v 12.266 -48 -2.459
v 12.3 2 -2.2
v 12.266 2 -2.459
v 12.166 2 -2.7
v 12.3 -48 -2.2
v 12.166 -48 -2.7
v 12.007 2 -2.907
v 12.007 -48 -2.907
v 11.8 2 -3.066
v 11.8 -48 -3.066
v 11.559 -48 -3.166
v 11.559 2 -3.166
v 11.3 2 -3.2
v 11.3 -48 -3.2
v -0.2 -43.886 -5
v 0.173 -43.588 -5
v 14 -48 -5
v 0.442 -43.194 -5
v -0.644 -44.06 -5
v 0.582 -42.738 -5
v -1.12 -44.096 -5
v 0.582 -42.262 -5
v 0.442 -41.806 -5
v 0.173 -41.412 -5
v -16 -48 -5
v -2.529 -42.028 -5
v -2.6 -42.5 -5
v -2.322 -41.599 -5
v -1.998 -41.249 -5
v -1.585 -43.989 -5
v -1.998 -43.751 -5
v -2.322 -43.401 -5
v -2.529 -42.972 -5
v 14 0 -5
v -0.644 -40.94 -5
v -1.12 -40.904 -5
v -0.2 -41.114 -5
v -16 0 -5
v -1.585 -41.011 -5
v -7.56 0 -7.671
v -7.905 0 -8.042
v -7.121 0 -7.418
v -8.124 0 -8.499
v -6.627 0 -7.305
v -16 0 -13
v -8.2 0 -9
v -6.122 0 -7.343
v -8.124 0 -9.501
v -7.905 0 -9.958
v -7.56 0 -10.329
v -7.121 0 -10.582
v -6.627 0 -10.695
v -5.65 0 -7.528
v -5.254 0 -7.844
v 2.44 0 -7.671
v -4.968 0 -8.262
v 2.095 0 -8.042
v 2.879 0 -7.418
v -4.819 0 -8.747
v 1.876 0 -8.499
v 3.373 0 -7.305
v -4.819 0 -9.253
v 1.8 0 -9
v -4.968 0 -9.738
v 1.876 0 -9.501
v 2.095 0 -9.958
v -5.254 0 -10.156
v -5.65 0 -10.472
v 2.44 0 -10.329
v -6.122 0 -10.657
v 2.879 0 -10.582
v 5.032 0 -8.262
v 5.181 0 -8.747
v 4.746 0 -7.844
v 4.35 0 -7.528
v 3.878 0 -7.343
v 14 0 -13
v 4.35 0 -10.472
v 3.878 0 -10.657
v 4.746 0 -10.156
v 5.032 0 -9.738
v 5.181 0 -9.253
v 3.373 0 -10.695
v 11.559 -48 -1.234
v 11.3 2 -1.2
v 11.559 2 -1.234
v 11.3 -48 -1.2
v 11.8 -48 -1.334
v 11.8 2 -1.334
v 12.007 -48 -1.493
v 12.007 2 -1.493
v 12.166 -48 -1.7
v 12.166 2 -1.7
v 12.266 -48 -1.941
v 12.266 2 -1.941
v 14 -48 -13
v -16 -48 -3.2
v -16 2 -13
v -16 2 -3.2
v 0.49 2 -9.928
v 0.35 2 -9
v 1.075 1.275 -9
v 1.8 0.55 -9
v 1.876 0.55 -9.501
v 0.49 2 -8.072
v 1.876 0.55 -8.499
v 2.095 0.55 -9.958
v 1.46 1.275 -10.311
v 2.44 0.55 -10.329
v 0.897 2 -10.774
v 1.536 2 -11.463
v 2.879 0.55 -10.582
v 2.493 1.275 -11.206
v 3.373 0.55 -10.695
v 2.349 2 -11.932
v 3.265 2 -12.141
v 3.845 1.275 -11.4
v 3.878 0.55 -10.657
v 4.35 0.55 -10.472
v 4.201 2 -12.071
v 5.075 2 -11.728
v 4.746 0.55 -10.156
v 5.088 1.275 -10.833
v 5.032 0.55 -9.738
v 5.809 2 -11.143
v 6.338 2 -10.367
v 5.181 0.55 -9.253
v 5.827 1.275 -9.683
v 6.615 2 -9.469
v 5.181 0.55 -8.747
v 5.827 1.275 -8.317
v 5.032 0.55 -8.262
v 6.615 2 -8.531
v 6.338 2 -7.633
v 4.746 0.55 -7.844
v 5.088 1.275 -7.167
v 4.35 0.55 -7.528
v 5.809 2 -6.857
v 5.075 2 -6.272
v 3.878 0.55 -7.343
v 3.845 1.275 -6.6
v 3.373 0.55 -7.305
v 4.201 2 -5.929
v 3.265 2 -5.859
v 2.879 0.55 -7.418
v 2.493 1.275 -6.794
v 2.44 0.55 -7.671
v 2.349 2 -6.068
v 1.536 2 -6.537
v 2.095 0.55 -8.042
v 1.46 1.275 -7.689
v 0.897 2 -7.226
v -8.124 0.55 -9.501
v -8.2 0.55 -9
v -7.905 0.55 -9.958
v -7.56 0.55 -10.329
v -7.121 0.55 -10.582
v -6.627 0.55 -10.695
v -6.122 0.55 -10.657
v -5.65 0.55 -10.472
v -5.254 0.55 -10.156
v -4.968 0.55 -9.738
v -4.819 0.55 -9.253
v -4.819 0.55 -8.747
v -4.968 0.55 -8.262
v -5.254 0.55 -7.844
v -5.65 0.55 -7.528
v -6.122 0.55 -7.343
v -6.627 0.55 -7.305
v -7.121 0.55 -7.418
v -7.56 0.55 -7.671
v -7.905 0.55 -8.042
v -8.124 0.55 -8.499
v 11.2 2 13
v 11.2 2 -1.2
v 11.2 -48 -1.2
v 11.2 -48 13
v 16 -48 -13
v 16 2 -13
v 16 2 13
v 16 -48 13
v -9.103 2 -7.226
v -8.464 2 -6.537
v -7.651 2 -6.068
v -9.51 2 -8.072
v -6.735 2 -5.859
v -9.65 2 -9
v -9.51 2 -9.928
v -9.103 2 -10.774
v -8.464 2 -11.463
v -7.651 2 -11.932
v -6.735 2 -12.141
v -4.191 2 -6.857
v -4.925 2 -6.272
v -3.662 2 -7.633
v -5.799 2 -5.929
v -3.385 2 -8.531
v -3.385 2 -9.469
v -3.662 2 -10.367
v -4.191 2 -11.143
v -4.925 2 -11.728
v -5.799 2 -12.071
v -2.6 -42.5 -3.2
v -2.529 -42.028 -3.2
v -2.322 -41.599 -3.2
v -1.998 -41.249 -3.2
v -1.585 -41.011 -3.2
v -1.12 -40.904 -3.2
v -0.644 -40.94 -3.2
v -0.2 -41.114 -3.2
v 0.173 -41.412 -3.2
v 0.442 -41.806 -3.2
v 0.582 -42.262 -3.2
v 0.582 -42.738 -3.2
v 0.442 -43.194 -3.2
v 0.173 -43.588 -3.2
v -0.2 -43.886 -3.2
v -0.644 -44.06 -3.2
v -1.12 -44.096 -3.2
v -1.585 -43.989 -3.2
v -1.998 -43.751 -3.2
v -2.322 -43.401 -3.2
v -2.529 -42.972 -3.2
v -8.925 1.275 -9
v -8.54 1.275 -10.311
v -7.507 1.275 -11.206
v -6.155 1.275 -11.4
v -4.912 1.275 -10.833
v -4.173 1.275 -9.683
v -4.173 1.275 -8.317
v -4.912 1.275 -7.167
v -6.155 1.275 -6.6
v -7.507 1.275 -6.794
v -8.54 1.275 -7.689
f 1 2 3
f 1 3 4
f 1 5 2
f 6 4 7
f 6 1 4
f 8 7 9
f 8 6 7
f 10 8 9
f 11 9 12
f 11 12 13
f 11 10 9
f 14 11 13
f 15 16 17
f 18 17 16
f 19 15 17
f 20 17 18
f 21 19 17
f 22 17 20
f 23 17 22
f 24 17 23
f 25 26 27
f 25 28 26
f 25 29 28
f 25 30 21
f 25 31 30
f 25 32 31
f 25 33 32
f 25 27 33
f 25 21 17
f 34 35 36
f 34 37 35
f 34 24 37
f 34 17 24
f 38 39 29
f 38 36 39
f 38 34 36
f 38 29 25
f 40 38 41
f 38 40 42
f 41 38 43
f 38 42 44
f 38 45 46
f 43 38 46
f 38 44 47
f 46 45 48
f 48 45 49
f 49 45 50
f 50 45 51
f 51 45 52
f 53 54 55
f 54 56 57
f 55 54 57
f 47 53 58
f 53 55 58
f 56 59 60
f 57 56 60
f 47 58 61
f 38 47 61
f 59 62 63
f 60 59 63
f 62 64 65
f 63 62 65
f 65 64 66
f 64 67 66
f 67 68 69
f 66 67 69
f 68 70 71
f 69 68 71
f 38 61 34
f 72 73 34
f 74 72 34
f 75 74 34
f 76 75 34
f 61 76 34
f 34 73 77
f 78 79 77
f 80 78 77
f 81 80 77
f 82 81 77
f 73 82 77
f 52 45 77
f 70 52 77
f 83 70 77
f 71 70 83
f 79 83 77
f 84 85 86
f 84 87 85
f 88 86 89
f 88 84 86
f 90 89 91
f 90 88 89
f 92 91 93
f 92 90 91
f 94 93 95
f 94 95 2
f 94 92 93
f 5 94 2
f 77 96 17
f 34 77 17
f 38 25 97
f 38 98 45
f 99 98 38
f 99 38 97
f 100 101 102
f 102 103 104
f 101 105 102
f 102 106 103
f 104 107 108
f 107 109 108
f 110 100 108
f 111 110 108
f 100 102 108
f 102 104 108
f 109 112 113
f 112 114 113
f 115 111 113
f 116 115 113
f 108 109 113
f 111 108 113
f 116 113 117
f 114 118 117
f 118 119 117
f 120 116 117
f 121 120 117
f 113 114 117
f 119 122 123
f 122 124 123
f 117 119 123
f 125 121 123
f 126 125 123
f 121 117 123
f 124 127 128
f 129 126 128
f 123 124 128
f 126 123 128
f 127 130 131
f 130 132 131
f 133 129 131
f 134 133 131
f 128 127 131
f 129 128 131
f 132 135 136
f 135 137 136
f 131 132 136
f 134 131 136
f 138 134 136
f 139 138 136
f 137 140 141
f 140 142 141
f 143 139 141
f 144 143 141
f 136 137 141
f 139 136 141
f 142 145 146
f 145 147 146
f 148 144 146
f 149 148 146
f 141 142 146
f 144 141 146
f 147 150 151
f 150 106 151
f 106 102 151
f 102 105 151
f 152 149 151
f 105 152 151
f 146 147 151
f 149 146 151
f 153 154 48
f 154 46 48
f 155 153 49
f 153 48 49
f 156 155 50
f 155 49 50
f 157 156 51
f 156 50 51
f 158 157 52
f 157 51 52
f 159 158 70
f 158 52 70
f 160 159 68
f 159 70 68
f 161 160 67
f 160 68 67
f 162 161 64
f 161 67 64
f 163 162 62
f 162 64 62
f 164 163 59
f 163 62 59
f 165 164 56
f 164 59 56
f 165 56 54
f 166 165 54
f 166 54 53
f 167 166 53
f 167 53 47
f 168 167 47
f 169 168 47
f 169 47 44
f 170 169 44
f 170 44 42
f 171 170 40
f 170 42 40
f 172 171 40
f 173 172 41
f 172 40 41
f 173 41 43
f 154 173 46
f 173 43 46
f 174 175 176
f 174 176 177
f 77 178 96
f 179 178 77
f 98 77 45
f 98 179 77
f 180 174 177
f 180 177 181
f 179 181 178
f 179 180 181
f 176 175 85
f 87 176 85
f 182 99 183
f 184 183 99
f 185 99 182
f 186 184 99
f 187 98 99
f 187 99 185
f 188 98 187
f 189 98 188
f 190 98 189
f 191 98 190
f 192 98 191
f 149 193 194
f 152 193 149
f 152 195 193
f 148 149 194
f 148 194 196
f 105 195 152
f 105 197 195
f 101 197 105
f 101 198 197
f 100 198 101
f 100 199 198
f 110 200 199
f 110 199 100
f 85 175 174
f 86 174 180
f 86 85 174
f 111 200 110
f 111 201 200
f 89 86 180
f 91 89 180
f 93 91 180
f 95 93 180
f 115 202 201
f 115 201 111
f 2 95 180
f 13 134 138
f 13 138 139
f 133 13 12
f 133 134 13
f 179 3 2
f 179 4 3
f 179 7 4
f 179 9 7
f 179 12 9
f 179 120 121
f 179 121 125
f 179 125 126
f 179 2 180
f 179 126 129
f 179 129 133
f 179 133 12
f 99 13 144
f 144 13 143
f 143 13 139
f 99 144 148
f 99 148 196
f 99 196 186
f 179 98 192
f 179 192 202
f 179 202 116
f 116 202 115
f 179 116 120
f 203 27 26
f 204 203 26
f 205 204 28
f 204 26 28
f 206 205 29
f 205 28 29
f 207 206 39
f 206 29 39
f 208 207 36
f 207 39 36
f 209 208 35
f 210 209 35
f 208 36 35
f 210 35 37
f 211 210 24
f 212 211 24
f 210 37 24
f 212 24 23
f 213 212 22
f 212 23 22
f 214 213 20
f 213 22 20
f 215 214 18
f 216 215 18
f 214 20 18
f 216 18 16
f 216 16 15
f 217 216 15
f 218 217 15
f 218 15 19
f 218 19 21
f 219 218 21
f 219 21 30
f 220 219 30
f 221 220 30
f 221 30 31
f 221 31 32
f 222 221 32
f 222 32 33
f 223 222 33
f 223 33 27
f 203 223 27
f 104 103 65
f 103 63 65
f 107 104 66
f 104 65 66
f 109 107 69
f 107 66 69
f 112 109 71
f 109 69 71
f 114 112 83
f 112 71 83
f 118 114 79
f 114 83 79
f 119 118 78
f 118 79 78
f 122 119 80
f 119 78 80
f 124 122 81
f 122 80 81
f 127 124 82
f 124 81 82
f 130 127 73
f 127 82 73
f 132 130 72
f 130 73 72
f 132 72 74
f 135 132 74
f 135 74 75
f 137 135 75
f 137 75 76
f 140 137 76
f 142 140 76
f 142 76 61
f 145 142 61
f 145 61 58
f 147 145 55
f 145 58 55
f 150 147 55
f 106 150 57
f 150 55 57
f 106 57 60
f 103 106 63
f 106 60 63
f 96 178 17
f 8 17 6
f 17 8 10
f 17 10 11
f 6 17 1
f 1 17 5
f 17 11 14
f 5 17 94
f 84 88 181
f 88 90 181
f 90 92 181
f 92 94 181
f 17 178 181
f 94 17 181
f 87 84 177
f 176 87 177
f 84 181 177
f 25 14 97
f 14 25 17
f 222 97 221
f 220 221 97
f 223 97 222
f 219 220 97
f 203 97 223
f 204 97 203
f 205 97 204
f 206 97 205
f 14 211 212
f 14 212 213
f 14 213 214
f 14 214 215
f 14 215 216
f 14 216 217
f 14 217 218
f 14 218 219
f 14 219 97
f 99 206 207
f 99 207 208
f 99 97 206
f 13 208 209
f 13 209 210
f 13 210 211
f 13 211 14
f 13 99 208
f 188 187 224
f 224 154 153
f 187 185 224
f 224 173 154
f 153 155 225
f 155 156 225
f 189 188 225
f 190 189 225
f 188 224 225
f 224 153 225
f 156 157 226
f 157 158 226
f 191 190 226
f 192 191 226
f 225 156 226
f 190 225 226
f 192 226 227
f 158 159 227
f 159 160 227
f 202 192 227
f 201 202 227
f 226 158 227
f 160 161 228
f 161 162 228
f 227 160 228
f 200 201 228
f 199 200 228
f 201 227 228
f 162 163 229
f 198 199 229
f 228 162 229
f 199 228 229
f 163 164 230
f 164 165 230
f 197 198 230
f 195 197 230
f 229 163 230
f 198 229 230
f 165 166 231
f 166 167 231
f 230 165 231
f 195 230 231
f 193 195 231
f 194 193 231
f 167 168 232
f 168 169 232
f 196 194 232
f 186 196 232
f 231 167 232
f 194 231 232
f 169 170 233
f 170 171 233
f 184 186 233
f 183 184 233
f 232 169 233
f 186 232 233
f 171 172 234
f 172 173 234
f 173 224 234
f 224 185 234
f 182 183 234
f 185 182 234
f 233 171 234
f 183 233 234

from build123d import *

# Parameters (mm, degrees)
SKIZZE1_W                                            = 32
SKIZZE1_H                                            = 26
AUFSATZ_LINEAR_AUSTRAGEN1_DEPTH                      = 2
FORMSENKUNG_F_R_M3_LINSENSENKSCHRAUBE_MI_D           = 3.4
FORMSENKUNG_F_R_M3_LINSENSENKSCHRAUBE_MI_DEPTH       = 8.5
FORMSENKUNG_F_R_M3_LINSENSENKSCHRAUBE_MI_CSINK_D     = 6.3
FORMSENKUNG_F_R_M3_LINSENSENKSCHRAUBE_MI_CSINK_ANGLE = 90
FORMSENKUNG_F_R_M3_LINSENSENKSCHRAUBE_MI_TIP         = 1.021463052
AUFSATZ_LINEAR_AUSTRAGEN2_DEPTH                      = 48
SKIZZE12_W                                           = 27.2
SKIZZE12_H                                           = 16.2
SCHNITT_LINEAR_AUSTRAGEN3_DEPTH                      = 55.083269132
F_3_2_3_2_DURCHMESSER_BOHRUNG1_D                     = 3.2
SKIZZE16_W                                           = 1.1
SKIZZE16_H                                           = 2
SCHNITT_LINEAR_AUSTRAGEN5_DEPTH                      = 55.083269132
VERRUNDUNG1_R                                        = 1


with BuildPart() as part:
    # Skizze1 → Aufsatz-Linear austragen1 (new body)
    with BuildSketch(Plane(origin=(0, 0, 0), x_dir=(1, 0, 0), z_dir=(0, 1, 0))):
        Rectangle(SKIZZE1_W, SKIZZE1_H)
    extrude(amount=AUFSATZ_LINEAR_AUSTRAGEN1_DEPTH)

    # Formsenkung für M3 Linsensenkschraube mit Schlitz1
    with Locations(Plane(origin=(0, 2, 0), x_dir=(1, 0, 0), z_dir=(0, 1, 0))):
        with Locations((-6.5, 9), (3.5, 9)):
            CounterSinkHole(FORMSENKUNG_F_R_M3_LINSENSENKSCHRAUBE_MI_D / 2, FORMSENKUNG_F_R_M3_LINSENSENKSCHRAUBE_MI_CSINK_D / 2, depth=FORMSENKUNG_F_R_M3_LINSENSENKSCHRAUBE_MI_DEPTH, counter_sink_angle=FORMSENKUNG_F_R_M3_LINSENSENKSCHRAUBE_MI_CSINK_ANGLE)
            with Locations((0, 0, -(FORMSENKUNG_F_R_M3_LINSENSENKSCHRAUBE_MI_DEPTH + FORMSENKUNG_F_R_M3_LINSENSENKSCHRAUBE_MI_TIP / 2))):  # 118° drill point
                Cone(0, FORMSENKUNG_F_R_M3_LINSENSENKSCHRAUBE_MI_D / 2, FORMSENKUNG_F_R_M3_LINSENSENKSCHRAUBE_MI_TIP, mode=Mode.SUBTRACT)

    # Skizze11 → Aufsatz-Linear austragen2 (add)
    with BuildSketch(Plane.XZ):
        Polygon((16, 13), (16, -13), (14, -13), (14, -5), (-16, -5), (-16, -3.2), (11.2, -3.2), (11.2, 13), align=None)
    extrude(amount=AUFSATZ_LINEAR_AUSTRAGEN2_DEPTH)

    # Skizze12 → Schnitt-Linear austragen3 (cut, through all)
    with BuildSketch(Plane(origin=(0, 2, 0), x_dir=(1, 0, 0), z_dir=(0, 1, 0))):
        with Locations((-2.4, -4.9)):
            Rectangle(SKIZZE12_W, SKIZZE12_H)
    extrude(amount=-SCHNITT_LINEAR_AUSTRAGEN3_DEPTH, mode=Mode.SUBTRACT)

    # Ø3.2 (3.2) Durchmesser Bohrung1 (through all)
    with Locations(Plane.XY.offset(-3.2)):
        with Locations((-1, -42.5)):
            Hole(F_3_2_3_2_DURCHMESSER_BOHRUNG1_D / 2)

    # Skizze16 → Schnitt-Linear austragen5 (cut, through all)
    with BuildSketch(Plane(origin=(0, 2, 0), x_dir=(1, 0, 0), z_dir=(0, 1, 0))):
        with Locations((11.75, 2.2)):
            Rectangle(SKIZZE16_W, SKIZZE16_H)
    extrude(amount=-SCHNITT_LINEAR_AUSTRAGEN5_DEPTH, mode=Mode.SUBTRACT)

    # Verrundung1
    verrundung1_edges = [part.edges().sort_by_distance(p)[0] for p in [
        (12.3, -23, -3.2),
        (12.3, -23, -1.2),
    ]]
    fillet(verrundung1_edges, radius=VERRUNDUNG1_R - 0.0001)  # a hair under: the kernel refuses the full size


solid = part.part
